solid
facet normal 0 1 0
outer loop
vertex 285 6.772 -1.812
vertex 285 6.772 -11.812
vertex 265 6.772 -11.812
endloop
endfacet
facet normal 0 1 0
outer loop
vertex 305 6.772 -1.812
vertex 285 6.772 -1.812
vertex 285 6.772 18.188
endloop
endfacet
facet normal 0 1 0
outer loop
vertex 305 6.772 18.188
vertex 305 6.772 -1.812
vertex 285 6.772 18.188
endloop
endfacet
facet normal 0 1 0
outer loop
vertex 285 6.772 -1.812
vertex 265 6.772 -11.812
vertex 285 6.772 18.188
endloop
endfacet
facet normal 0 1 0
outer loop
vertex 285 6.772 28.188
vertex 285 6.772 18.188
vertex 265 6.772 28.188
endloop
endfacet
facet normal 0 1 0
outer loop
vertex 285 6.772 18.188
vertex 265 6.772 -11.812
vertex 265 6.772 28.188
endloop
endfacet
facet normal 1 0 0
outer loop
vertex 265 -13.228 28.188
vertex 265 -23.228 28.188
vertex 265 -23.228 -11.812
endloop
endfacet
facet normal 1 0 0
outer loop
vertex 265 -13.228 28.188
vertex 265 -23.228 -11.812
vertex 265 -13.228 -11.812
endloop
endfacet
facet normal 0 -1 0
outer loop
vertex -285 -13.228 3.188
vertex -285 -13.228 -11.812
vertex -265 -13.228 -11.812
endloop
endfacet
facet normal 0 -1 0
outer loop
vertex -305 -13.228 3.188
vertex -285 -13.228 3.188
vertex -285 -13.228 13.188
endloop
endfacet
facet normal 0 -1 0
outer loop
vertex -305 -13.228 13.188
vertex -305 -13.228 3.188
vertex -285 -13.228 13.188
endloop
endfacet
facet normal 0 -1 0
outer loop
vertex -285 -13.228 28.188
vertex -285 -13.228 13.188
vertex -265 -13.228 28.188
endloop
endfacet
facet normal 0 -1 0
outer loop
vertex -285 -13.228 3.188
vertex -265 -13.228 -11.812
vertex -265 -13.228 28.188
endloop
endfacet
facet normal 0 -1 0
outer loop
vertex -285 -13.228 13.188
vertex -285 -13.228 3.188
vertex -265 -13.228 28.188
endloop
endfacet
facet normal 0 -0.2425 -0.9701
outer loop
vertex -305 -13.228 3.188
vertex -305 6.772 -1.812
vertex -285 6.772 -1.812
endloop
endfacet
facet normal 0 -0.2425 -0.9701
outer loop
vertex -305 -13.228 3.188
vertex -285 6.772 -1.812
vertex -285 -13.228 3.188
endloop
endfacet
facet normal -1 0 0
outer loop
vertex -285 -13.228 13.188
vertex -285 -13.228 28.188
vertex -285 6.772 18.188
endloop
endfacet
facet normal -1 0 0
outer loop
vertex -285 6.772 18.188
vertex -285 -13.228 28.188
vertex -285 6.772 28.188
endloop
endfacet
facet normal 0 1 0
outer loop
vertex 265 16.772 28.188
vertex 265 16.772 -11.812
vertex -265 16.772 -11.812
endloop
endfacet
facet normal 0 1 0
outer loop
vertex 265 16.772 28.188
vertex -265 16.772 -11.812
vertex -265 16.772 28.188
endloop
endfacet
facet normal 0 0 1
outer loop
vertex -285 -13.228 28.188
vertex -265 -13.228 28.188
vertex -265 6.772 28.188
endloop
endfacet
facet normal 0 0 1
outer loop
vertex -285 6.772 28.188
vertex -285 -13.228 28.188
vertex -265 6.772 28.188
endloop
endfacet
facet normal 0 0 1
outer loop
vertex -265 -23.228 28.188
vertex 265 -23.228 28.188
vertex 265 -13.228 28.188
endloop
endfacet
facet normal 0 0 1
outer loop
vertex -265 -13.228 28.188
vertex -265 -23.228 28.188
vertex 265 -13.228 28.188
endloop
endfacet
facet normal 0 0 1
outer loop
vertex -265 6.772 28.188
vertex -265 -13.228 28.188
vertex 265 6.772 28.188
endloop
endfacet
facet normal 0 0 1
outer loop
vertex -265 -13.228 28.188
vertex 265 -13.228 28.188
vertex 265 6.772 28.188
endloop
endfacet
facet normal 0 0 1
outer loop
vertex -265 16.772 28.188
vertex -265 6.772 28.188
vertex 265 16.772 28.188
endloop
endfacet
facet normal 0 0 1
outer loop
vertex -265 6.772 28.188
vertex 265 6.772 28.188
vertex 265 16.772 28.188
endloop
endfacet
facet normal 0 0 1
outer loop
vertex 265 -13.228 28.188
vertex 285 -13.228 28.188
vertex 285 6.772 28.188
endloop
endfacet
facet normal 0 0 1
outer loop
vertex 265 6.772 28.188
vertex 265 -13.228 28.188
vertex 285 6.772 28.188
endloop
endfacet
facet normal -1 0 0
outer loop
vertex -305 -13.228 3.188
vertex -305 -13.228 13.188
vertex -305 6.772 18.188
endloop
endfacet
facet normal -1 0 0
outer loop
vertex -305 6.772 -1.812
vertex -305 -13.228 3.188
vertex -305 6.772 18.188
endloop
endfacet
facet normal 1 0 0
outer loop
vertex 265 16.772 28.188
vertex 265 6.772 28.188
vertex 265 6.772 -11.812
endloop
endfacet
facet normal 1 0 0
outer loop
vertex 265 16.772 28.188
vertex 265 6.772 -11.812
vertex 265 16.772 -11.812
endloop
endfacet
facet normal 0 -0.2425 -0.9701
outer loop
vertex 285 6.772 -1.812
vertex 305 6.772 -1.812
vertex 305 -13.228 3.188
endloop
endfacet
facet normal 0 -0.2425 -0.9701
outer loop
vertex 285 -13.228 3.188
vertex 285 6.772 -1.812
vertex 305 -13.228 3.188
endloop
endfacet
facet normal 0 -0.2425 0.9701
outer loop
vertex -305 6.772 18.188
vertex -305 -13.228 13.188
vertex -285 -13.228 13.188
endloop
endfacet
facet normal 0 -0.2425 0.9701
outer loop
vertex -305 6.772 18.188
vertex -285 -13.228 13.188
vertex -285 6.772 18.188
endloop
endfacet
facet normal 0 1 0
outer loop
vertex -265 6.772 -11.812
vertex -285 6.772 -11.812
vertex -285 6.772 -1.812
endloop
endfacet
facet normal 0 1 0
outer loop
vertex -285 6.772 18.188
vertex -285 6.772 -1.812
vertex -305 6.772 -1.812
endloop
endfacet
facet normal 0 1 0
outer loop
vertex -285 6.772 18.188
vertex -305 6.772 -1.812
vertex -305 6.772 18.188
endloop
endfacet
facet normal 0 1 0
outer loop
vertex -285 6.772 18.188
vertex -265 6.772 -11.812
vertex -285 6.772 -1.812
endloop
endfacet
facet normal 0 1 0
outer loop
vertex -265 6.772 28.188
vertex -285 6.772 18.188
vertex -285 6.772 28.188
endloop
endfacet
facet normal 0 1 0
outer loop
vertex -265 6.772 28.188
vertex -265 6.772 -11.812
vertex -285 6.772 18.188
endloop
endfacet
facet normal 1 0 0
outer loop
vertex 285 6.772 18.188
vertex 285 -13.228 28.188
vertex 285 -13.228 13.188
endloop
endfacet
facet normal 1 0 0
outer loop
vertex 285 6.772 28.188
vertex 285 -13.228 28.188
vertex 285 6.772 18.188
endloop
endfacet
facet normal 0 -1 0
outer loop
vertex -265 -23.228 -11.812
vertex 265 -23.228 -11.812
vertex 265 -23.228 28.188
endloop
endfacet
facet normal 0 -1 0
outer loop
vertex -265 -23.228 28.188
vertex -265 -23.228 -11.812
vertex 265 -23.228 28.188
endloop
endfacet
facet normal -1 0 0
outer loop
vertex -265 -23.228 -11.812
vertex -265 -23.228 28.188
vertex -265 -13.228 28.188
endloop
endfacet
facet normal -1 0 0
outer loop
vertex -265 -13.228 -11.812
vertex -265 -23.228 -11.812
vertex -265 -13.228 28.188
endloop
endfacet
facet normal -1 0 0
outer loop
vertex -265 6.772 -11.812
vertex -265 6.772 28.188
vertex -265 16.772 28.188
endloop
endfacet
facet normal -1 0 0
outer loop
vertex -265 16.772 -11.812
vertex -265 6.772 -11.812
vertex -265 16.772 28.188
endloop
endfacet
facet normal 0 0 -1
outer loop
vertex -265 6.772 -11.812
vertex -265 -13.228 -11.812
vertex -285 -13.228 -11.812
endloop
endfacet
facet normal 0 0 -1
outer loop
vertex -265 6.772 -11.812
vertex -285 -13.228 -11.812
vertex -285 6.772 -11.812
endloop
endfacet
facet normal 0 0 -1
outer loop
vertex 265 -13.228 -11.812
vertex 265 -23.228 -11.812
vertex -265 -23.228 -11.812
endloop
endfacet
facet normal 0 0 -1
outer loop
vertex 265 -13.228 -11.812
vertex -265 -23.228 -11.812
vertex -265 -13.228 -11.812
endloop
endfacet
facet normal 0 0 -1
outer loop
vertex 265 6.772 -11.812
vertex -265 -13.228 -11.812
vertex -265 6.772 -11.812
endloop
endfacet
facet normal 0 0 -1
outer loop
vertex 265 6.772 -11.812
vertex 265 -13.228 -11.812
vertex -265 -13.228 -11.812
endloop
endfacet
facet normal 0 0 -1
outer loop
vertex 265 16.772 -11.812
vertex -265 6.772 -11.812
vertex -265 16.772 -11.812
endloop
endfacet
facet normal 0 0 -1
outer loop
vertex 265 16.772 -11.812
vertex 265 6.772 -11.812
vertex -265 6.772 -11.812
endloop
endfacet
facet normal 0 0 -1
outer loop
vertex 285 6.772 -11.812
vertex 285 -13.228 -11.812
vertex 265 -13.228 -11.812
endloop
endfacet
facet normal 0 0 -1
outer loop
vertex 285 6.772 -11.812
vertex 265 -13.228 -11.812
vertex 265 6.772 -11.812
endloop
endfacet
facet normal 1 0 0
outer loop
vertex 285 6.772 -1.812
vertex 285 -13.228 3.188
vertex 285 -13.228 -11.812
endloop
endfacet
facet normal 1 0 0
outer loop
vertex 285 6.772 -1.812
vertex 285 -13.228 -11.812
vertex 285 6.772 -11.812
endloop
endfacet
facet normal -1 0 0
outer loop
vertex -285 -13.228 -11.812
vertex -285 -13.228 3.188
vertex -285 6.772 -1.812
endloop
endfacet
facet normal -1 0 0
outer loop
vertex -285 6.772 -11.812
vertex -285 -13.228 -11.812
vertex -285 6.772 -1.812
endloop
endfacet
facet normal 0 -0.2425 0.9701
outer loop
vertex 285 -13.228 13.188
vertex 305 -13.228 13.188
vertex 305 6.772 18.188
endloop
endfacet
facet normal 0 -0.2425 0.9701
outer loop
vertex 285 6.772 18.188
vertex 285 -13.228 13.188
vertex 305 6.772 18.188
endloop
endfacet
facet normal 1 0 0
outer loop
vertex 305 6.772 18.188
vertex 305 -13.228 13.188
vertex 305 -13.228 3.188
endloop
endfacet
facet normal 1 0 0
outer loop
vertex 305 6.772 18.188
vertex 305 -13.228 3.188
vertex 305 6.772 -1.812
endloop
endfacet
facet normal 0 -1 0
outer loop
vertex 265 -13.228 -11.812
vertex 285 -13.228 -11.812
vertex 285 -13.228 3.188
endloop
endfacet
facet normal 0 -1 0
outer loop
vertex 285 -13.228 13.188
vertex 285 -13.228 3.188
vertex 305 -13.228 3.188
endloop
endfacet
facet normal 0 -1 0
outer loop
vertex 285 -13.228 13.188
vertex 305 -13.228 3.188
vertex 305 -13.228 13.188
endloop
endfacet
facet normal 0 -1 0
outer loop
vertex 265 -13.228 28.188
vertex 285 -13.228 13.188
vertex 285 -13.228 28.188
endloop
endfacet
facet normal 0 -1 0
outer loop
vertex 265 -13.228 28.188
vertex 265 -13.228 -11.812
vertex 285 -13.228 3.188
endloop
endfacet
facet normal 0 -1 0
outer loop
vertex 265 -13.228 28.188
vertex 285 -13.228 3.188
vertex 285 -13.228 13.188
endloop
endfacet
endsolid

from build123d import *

# Parameters (mm, degrees)
F0_W     = 40
F0_H     = 40
F1_DEPTH = 265
F2_W     = 20
F2_H     = 40
F3_DEPTH = 40
F5_DEPTH = 20


with BuildPart() as f1:
    # F0 (on Right) → F1 (new body)
    with BuildSketch(Plane.YZ):
        with Locations((-3.228404, 8.187629)):
            Rectangle(F0_W, F0_H)
    extrude(amount=F1_DEPTH)

    # F2 (on face) → F3 (join)
    with BuildSketch(Plane.YZ.offset(265)):
        with Locations((-3.228404, 8.187629)):
            Rectangle(F2_W, F2_H)
    extrude(amount=F3_DEPTH)

    # F4 (on face) → F5 (cut)
    with BuildSketch(Plane.YZ.offset(305)):
        Polygon((6.771596, -1.812371), (-13.228404, 3.187629), (-13.228404, -11.812371), (6.771596, -11.812371), align=None)
        Polygon((-13.228404, 28.187629), (-13.228404, 13.187629), (6.771596, 18.187629), (6.771596, 28.187629), align=None)
    extrude(amount=-F5_DEPTH, mode=Mode.SUBTRACT)

    # F6: F1 across face


with BuildPart() as f1_1:
    add(f1.part)
    add(f1.part.mirror(Plane(origin=(0, -3.228404, 8.187629), x_dir=(0, 1, 0), z_dir=(-1, 0, 0))))


solid = f1_1.part
